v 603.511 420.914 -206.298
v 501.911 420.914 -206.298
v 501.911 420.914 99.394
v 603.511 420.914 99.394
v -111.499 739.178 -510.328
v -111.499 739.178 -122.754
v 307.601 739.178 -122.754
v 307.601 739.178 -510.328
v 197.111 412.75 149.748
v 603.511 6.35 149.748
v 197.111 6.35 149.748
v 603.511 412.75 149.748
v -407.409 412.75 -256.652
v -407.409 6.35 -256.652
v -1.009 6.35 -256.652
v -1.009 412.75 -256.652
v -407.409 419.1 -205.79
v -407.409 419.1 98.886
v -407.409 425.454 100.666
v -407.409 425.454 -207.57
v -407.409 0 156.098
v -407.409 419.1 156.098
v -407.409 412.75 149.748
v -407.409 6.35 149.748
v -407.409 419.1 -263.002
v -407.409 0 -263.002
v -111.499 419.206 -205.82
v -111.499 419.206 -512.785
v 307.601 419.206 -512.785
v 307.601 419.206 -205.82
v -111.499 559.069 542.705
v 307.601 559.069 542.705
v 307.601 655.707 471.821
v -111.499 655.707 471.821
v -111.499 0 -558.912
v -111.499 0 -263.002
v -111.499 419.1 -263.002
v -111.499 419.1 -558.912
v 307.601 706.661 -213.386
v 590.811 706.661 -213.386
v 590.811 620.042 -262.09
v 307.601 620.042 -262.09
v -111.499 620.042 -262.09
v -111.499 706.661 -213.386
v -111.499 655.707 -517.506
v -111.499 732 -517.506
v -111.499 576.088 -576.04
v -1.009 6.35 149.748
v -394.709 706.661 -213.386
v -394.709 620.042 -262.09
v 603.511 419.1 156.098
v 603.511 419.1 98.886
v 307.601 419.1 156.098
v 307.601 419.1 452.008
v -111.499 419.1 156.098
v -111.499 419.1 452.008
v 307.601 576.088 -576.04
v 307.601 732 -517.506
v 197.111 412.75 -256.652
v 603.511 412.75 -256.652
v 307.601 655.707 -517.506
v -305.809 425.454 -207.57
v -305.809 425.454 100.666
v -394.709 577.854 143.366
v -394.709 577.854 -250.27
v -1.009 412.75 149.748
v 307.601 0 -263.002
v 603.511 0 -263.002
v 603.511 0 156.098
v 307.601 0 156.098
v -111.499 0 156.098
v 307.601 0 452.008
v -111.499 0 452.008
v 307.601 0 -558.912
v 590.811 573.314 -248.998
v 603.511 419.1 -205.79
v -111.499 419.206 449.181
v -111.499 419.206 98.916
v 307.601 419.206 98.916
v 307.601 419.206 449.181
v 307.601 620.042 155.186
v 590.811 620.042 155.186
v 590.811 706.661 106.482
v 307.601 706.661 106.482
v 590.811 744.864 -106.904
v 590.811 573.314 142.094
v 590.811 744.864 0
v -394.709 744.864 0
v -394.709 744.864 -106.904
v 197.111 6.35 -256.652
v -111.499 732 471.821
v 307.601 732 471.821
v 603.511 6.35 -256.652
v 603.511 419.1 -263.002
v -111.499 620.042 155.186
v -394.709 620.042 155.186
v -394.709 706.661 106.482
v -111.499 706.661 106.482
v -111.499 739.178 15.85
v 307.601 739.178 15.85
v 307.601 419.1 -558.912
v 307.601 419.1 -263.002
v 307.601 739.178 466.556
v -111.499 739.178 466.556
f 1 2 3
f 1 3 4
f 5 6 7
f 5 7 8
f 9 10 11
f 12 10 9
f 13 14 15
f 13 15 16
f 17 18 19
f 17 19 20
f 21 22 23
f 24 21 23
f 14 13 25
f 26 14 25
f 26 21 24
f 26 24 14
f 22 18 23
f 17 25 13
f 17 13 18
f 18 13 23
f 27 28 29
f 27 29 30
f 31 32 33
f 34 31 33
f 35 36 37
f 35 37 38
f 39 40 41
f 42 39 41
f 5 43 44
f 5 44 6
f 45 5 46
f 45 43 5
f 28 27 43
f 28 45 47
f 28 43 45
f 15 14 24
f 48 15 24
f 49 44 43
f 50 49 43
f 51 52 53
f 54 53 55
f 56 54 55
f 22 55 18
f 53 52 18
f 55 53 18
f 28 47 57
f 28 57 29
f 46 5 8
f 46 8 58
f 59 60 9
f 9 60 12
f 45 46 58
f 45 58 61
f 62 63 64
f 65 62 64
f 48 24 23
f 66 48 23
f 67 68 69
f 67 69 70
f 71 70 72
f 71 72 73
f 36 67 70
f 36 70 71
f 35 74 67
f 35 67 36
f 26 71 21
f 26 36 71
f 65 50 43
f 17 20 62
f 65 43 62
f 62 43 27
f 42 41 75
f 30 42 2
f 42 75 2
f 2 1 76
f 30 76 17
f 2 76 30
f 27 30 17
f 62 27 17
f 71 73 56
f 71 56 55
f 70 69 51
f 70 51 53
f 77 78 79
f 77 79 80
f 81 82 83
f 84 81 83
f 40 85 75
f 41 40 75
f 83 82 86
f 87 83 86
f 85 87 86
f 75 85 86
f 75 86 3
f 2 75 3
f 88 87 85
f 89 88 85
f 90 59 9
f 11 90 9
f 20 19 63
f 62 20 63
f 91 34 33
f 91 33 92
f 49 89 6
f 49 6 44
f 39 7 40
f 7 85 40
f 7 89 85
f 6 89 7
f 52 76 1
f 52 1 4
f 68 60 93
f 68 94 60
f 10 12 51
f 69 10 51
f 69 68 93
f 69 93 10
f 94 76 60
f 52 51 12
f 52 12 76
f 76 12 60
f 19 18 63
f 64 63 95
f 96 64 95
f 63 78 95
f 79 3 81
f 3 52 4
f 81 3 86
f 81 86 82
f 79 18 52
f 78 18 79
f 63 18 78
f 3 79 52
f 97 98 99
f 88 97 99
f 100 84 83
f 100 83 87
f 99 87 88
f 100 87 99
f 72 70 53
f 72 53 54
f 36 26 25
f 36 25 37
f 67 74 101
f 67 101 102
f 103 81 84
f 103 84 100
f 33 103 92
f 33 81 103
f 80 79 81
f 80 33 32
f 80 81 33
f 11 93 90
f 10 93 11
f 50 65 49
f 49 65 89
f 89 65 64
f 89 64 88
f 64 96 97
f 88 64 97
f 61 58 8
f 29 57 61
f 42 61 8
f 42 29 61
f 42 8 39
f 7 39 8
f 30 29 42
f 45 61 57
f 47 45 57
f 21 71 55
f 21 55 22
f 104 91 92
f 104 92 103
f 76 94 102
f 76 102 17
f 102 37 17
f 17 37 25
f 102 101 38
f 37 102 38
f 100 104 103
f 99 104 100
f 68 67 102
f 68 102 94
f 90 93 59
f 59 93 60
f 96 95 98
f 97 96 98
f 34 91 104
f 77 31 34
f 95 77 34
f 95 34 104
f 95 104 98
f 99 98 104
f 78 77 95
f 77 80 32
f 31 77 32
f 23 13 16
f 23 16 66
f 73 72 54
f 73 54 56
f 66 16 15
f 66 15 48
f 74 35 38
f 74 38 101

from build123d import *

# Parameters (mm, degrees)
BOSS_EXTRUDE1_DEPTH             = 419.1
SKETCH2_W                       = 406.4
SKETCH2_H                       = 406.4
CUT_EXTRUDE1_DEPTH              = 406.4
BOSS_EXTRUDE2_START             = -505.46
BOSS_EXTRUDE2_DEPTH             = 1010.92
CUT_EXTRUDE2_DEPTH              = 453.007941176
CUT_EXTRUDE2_DEPTH_BACK         = 559.912058824
BOSS_EXTRUDE3_REACH             = 409.409
BOSS_EXTRUDE3_DIRECTION_2_REACH = 605.511


with BuildPart() as part:
    # Sketch1 → Boss-Extrude1 (new body)
    with BuildSketch(Plane(origin=(0, 0, 0), x_dir=(1, 0, 0), z_dir=(0, 1, 0))):
        Polygon((-111.498529412, 263.002058824), (-111.498529412, 558.912058824), (307.601470588, 558.912058824), (307.601470588, 263.002058824), (603.511470588, 263.002058824), (603.511470588, -156.097941176), (307.601470588, -156.097941176), (307.601470588, -452.007941176), (-111.498529412, -452.007941176), (-111.498529412, -156.097941176), (-407.408529412, -156.097941176), (-407.408529412, 263.002058824), align=None)
    extrude(amount=BOSS_EXTRUDE1_DEPTH)

    # Sketch2 → Cut-Extrude1 (cut)
    with BuildSketch(Plane.ZY.offset(407.408529412)):
        with Locations((-53.452058824, 209.55)):
            Rectangle(SKETCH2_W, SKETCH2_H)
    cut_extrude1 = extrude(amount=-CUT_EXTRUDE1_DEPTH, mode=Mode.SUBTRACT)

    # Mirror1: Cut-Extrude1 across plane
    add(cut_extrude1.mirror(Plane.ZY.offset(-98.051470588)), mode=Mode.SUBTRACT)

    # Sketch3 → Boss-Extrude2 (add)
    with BuildSketch(Plane.ZY.offset(-98.051470588).offset(BOSS_EXTRUDE2_START)):
        Polygon((-205.790064307, 419.1), (98.88594666, 419.1), (155.185867753, 620.042461281), (106.481982696, 706.660847592), (0, 744.864396526), (-106.904117647, 744.864396526), (-213.386100343, 706.660847592), (-262.0899854, 620.042461281), align=None)
    extrude(amount=BOSS_EXTRUDE2_DEPTH)

    # Sketch4 → Cut-Extrude2 (cut, two sides)
    with BuildSketch(Plane.XY) as cut_extrude2_sk:
        Polygon((-305.808529412, 425.454129149), (-394.708529412, 577.854129149), (-394.708529412, 796.580225866), (590.811470588, 796.580225866), (590.811470588, 573.314003685), (501.911470588, 420.914003685), (647.189097077, 420.914003685), (647.189097077, 885.635632277), (-516.891145843, 876.882773083), (-501.7416469, 425.454129149), align=None)
    extrude(amount=CUT_EXTRUDE2_DEPTH, mode=Mode.SUBTRACT)
    extrude(cut_extrude2_sk.sketch, amount=-CUT_EXTRUDE2_DEPTH_BACK, mode=Mode.SUBTRACT)

    # Boss-Extrude3: up to this face of the body (flat: up to its plane)
    boss_extrude3_end = Plane(part.part.faces().sort_by_distance((-111.498529412, 209.55, 304.052941176))[0])
    # Sketch5 → Boss-Extrude3 (add, up to the picked face)
    with BuildSketch(Plane(origin=(0, 0, 0), x_dir=(0, 0, -1), z_dir=(1, 0, 0)), mode=Mode.PRIVATE) as boss_extrude3_sk1:
        Polygon((-449.181000693, 419.206207419), (-542.705165158, 559.069271968), (-471.821113531, 655.706983405), (-471.821113531, 732.000172587), (-466.55643227, 739.177622759), (510.328311202, 739.177622759), (517.505761373, 732.000172587), (517.505761373, 655.706983405), (576.040352368, 576.087761543), (512.785450653, 419.206207419), align=None)
    boss_extrude3_tool1 = split(extrude(boss_extrude3_sk1.sketch, amount=-BOSS_EXTRUDE3_REACH, mode=Mode.PRIVATE), bisect_by=boss_extrude3_end, keep=Keep.BOTH, mode=Mode.PRIVATE)
    add(boss_extrude3_tool1.solids().sort_by_distance((0, 578.35257, -22.327279))[0])

    # Boss-Extrude3 direction 2: up to this face of the body (flat: up to its plane)
    boss_extrude3_direction_2_end = Plane(part.part.faces().sort_by_distance((307.601470588, 209.55, 304.052941176))[0])
    # Sketch5 → Boss-Extrude3 direction 2 (add, up to the picked face)
    with BuildSketch(Plane(origin=(0, 0, 0), x_dir=(0, 0, -1), z_dir=(1, 0, 0)), mode=Mode.PRIVATE) as boss_extrude3_direction_2_sk1:
        Polygon((-449.181000693, 419.206207419), (-542.705165158, 559.069271968), (-471.821113531, 655.706983405), (-471.821113531, 732.000172587), (-466.55643227, 739.177622759), (510.328311202, 739.177622759), (517.505761373, 732.000172587), (517.505761373, 655.706983405), (576.040352368, 576.087761543), (512.785450653, 419.206207419), align=None)
    boss_extrude3_direction_2_tool1 = split(extrude(boss_extrude3_direction_2_sk1.sketch, amount=BOSS_EXTRUDE3_DIRECTION_2_REACH, mode=Mode.PRIVATE), bisect_by=boss_extrude3_direction_2_end, keep=Keep.BOTH, mode=Mode.PRIVATE)
    add(boss_extrude3_direction_2_tool1.solids().sort_by_distance((0, 578.35257, -22.327279))[0])


solid = part.part
